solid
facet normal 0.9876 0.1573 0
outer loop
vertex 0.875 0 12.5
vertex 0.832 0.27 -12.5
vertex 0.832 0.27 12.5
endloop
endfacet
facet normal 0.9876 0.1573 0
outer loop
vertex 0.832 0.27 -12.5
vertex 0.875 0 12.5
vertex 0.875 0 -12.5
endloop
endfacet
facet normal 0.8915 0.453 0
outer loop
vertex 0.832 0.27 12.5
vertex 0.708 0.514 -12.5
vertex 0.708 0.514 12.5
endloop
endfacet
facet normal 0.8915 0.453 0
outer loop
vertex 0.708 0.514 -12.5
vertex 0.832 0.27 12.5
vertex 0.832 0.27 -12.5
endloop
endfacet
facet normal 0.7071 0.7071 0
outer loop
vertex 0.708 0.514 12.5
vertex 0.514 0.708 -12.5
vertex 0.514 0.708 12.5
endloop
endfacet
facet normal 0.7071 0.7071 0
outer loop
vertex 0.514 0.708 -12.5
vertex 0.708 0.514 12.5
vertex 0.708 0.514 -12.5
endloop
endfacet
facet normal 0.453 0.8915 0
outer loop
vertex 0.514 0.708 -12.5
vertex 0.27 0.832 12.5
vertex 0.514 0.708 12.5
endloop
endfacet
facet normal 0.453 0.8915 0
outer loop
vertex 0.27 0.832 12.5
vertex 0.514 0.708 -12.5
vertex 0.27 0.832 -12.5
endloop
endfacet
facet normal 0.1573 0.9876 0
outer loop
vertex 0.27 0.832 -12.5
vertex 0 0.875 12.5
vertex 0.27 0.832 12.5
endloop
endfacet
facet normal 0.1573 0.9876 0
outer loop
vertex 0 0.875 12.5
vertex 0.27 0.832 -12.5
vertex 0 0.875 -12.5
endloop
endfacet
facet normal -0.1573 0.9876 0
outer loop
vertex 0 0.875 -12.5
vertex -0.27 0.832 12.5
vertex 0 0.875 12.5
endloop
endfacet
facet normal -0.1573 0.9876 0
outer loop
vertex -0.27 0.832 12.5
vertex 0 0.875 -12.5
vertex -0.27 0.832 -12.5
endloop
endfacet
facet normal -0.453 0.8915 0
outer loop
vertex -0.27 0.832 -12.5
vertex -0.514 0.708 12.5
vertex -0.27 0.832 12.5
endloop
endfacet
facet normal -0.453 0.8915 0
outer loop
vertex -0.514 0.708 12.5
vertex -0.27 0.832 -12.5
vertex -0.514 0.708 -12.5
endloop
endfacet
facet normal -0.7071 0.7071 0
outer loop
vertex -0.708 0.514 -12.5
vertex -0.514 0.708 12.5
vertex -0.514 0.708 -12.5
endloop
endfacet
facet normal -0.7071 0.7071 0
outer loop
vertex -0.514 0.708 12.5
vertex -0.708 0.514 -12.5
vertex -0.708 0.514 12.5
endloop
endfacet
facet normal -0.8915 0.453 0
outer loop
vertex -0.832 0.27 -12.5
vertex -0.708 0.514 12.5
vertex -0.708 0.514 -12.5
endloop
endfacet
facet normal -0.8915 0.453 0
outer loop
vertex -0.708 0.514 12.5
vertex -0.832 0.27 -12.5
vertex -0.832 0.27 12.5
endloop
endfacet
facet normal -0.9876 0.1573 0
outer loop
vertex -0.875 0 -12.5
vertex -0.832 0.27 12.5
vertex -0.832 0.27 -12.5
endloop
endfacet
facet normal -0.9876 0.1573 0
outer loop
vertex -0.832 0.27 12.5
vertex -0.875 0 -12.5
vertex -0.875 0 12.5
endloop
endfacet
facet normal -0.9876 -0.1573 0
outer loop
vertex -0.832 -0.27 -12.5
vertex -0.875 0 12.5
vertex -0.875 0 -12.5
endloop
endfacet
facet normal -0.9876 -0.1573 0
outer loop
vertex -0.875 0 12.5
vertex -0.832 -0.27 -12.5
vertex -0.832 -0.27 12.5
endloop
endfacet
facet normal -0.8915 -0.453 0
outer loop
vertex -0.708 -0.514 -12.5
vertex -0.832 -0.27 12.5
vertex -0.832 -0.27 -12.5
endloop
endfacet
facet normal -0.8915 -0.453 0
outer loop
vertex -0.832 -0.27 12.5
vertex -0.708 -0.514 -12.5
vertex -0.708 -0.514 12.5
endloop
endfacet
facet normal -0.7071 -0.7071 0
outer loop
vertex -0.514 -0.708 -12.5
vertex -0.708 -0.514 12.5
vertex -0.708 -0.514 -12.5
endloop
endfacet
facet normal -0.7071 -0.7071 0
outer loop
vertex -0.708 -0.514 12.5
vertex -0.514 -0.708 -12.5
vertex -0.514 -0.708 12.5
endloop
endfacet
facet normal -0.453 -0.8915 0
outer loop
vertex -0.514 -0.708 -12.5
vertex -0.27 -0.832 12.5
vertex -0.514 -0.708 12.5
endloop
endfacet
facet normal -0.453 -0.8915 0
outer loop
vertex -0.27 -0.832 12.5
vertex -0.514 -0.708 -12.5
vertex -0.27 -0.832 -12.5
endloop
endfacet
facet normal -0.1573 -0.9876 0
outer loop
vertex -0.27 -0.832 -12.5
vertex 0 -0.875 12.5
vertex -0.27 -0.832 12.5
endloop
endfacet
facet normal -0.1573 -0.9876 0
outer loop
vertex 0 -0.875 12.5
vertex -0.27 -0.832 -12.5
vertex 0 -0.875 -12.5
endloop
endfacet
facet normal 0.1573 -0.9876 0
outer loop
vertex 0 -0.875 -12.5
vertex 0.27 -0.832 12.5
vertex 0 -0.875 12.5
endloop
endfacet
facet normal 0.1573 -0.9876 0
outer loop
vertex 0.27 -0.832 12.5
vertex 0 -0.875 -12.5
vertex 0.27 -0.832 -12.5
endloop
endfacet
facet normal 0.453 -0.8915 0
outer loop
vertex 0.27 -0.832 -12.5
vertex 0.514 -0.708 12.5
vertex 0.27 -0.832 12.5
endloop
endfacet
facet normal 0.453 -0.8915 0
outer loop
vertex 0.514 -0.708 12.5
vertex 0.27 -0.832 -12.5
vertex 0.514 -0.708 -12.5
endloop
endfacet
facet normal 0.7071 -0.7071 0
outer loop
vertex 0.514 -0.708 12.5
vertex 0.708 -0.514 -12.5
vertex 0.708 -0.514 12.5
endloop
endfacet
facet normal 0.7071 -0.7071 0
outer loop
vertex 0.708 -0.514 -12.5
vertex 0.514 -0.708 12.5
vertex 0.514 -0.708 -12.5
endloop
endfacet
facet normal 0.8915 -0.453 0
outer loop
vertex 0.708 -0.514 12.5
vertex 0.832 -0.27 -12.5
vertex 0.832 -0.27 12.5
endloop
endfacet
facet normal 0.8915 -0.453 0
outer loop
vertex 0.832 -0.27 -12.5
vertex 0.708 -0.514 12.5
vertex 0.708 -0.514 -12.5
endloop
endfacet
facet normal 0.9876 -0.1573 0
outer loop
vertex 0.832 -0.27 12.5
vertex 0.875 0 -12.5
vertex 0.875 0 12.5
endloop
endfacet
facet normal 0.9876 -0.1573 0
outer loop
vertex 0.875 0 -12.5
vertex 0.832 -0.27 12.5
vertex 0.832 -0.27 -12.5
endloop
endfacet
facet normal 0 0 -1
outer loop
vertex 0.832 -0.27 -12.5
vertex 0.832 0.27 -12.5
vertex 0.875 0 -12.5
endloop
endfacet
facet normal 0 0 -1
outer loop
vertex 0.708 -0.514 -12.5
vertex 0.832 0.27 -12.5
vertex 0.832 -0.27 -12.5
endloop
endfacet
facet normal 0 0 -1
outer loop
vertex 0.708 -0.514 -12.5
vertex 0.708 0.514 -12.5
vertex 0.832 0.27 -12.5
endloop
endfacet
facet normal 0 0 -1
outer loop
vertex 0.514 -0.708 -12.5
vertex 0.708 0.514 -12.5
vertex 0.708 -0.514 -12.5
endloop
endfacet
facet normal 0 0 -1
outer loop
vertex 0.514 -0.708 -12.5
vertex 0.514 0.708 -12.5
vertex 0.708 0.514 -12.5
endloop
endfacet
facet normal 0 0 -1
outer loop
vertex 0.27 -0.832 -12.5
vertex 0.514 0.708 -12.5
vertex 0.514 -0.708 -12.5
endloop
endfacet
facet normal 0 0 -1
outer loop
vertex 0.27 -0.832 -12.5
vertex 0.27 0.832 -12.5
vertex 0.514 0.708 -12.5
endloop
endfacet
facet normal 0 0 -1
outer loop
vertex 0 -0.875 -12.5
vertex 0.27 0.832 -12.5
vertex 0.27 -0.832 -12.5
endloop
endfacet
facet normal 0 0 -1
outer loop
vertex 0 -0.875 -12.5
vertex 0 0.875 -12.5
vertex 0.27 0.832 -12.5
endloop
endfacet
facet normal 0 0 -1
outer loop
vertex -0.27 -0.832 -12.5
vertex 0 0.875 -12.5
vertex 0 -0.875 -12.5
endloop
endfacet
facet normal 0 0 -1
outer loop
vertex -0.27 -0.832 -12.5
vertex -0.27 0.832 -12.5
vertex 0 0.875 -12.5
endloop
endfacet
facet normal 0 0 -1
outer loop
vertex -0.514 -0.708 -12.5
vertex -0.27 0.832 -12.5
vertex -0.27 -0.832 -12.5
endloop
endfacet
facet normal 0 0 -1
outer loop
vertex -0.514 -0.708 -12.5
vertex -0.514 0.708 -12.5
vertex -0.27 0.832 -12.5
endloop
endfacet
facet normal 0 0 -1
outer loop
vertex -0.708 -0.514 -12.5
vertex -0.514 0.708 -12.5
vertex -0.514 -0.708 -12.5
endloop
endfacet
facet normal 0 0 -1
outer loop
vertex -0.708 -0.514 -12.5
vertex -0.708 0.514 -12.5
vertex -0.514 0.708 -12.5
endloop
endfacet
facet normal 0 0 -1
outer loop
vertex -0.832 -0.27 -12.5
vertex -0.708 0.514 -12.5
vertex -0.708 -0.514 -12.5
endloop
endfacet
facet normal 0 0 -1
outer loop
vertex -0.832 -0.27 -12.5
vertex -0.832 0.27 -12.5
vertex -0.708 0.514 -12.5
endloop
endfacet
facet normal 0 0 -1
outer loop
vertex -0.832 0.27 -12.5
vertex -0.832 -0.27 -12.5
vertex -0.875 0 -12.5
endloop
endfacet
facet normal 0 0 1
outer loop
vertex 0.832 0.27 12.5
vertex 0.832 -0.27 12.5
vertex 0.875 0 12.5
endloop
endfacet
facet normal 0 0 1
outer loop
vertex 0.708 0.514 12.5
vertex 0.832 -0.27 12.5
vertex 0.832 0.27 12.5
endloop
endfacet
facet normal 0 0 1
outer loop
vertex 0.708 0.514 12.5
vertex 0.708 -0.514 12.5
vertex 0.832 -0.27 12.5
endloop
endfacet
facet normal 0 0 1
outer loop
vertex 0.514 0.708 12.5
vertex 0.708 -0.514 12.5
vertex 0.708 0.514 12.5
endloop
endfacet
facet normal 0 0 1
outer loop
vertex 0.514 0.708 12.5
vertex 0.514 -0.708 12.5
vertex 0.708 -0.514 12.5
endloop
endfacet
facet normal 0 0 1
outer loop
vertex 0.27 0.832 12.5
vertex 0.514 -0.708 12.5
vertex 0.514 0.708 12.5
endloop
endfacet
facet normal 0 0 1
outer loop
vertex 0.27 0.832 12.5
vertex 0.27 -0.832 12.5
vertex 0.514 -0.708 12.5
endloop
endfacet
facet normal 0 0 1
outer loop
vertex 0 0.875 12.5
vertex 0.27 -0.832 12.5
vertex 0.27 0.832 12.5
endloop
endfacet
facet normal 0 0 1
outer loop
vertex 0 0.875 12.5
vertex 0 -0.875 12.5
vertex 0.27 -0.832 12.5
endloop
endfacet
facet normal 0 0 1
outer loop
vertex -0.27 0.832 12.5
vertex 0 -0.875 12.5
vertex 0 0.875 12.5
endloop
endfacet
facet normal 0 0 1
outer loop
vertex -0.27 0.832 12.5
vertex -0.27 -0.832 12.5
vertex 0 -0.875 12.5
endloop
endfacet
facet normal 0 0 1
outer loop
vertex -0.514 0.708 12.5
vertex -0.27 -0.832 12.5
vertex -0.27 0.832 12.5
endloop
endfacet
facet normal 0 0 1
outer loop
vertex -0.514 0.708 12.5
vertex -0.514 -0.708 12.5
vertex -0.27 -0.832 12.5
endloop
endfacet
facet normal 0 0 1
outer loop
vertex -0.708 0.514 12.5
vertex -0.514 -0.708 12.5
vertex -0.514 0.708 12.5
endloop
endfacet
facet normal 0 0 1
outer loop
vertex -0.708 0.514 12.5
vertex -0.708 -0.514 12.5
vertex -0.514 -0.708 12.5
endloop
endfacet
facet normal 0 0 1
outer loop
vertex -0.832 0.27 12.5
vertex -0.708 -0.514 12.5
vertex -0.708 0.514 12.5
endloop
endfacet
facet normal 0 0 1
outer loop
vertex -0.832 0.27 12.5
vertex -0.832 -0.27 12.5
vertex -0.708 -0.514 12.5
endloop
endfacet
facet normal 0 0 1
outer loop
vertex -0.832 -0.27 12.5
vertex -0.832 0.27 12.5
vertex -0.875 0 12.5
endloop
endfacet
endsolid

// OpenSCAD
// NAME: Filament 25 mm
// COLOR: 80
// CATEGORY: Support

color("darkorange")
    cylinder(d=1.75, h=25, center=true, $fn=20);
